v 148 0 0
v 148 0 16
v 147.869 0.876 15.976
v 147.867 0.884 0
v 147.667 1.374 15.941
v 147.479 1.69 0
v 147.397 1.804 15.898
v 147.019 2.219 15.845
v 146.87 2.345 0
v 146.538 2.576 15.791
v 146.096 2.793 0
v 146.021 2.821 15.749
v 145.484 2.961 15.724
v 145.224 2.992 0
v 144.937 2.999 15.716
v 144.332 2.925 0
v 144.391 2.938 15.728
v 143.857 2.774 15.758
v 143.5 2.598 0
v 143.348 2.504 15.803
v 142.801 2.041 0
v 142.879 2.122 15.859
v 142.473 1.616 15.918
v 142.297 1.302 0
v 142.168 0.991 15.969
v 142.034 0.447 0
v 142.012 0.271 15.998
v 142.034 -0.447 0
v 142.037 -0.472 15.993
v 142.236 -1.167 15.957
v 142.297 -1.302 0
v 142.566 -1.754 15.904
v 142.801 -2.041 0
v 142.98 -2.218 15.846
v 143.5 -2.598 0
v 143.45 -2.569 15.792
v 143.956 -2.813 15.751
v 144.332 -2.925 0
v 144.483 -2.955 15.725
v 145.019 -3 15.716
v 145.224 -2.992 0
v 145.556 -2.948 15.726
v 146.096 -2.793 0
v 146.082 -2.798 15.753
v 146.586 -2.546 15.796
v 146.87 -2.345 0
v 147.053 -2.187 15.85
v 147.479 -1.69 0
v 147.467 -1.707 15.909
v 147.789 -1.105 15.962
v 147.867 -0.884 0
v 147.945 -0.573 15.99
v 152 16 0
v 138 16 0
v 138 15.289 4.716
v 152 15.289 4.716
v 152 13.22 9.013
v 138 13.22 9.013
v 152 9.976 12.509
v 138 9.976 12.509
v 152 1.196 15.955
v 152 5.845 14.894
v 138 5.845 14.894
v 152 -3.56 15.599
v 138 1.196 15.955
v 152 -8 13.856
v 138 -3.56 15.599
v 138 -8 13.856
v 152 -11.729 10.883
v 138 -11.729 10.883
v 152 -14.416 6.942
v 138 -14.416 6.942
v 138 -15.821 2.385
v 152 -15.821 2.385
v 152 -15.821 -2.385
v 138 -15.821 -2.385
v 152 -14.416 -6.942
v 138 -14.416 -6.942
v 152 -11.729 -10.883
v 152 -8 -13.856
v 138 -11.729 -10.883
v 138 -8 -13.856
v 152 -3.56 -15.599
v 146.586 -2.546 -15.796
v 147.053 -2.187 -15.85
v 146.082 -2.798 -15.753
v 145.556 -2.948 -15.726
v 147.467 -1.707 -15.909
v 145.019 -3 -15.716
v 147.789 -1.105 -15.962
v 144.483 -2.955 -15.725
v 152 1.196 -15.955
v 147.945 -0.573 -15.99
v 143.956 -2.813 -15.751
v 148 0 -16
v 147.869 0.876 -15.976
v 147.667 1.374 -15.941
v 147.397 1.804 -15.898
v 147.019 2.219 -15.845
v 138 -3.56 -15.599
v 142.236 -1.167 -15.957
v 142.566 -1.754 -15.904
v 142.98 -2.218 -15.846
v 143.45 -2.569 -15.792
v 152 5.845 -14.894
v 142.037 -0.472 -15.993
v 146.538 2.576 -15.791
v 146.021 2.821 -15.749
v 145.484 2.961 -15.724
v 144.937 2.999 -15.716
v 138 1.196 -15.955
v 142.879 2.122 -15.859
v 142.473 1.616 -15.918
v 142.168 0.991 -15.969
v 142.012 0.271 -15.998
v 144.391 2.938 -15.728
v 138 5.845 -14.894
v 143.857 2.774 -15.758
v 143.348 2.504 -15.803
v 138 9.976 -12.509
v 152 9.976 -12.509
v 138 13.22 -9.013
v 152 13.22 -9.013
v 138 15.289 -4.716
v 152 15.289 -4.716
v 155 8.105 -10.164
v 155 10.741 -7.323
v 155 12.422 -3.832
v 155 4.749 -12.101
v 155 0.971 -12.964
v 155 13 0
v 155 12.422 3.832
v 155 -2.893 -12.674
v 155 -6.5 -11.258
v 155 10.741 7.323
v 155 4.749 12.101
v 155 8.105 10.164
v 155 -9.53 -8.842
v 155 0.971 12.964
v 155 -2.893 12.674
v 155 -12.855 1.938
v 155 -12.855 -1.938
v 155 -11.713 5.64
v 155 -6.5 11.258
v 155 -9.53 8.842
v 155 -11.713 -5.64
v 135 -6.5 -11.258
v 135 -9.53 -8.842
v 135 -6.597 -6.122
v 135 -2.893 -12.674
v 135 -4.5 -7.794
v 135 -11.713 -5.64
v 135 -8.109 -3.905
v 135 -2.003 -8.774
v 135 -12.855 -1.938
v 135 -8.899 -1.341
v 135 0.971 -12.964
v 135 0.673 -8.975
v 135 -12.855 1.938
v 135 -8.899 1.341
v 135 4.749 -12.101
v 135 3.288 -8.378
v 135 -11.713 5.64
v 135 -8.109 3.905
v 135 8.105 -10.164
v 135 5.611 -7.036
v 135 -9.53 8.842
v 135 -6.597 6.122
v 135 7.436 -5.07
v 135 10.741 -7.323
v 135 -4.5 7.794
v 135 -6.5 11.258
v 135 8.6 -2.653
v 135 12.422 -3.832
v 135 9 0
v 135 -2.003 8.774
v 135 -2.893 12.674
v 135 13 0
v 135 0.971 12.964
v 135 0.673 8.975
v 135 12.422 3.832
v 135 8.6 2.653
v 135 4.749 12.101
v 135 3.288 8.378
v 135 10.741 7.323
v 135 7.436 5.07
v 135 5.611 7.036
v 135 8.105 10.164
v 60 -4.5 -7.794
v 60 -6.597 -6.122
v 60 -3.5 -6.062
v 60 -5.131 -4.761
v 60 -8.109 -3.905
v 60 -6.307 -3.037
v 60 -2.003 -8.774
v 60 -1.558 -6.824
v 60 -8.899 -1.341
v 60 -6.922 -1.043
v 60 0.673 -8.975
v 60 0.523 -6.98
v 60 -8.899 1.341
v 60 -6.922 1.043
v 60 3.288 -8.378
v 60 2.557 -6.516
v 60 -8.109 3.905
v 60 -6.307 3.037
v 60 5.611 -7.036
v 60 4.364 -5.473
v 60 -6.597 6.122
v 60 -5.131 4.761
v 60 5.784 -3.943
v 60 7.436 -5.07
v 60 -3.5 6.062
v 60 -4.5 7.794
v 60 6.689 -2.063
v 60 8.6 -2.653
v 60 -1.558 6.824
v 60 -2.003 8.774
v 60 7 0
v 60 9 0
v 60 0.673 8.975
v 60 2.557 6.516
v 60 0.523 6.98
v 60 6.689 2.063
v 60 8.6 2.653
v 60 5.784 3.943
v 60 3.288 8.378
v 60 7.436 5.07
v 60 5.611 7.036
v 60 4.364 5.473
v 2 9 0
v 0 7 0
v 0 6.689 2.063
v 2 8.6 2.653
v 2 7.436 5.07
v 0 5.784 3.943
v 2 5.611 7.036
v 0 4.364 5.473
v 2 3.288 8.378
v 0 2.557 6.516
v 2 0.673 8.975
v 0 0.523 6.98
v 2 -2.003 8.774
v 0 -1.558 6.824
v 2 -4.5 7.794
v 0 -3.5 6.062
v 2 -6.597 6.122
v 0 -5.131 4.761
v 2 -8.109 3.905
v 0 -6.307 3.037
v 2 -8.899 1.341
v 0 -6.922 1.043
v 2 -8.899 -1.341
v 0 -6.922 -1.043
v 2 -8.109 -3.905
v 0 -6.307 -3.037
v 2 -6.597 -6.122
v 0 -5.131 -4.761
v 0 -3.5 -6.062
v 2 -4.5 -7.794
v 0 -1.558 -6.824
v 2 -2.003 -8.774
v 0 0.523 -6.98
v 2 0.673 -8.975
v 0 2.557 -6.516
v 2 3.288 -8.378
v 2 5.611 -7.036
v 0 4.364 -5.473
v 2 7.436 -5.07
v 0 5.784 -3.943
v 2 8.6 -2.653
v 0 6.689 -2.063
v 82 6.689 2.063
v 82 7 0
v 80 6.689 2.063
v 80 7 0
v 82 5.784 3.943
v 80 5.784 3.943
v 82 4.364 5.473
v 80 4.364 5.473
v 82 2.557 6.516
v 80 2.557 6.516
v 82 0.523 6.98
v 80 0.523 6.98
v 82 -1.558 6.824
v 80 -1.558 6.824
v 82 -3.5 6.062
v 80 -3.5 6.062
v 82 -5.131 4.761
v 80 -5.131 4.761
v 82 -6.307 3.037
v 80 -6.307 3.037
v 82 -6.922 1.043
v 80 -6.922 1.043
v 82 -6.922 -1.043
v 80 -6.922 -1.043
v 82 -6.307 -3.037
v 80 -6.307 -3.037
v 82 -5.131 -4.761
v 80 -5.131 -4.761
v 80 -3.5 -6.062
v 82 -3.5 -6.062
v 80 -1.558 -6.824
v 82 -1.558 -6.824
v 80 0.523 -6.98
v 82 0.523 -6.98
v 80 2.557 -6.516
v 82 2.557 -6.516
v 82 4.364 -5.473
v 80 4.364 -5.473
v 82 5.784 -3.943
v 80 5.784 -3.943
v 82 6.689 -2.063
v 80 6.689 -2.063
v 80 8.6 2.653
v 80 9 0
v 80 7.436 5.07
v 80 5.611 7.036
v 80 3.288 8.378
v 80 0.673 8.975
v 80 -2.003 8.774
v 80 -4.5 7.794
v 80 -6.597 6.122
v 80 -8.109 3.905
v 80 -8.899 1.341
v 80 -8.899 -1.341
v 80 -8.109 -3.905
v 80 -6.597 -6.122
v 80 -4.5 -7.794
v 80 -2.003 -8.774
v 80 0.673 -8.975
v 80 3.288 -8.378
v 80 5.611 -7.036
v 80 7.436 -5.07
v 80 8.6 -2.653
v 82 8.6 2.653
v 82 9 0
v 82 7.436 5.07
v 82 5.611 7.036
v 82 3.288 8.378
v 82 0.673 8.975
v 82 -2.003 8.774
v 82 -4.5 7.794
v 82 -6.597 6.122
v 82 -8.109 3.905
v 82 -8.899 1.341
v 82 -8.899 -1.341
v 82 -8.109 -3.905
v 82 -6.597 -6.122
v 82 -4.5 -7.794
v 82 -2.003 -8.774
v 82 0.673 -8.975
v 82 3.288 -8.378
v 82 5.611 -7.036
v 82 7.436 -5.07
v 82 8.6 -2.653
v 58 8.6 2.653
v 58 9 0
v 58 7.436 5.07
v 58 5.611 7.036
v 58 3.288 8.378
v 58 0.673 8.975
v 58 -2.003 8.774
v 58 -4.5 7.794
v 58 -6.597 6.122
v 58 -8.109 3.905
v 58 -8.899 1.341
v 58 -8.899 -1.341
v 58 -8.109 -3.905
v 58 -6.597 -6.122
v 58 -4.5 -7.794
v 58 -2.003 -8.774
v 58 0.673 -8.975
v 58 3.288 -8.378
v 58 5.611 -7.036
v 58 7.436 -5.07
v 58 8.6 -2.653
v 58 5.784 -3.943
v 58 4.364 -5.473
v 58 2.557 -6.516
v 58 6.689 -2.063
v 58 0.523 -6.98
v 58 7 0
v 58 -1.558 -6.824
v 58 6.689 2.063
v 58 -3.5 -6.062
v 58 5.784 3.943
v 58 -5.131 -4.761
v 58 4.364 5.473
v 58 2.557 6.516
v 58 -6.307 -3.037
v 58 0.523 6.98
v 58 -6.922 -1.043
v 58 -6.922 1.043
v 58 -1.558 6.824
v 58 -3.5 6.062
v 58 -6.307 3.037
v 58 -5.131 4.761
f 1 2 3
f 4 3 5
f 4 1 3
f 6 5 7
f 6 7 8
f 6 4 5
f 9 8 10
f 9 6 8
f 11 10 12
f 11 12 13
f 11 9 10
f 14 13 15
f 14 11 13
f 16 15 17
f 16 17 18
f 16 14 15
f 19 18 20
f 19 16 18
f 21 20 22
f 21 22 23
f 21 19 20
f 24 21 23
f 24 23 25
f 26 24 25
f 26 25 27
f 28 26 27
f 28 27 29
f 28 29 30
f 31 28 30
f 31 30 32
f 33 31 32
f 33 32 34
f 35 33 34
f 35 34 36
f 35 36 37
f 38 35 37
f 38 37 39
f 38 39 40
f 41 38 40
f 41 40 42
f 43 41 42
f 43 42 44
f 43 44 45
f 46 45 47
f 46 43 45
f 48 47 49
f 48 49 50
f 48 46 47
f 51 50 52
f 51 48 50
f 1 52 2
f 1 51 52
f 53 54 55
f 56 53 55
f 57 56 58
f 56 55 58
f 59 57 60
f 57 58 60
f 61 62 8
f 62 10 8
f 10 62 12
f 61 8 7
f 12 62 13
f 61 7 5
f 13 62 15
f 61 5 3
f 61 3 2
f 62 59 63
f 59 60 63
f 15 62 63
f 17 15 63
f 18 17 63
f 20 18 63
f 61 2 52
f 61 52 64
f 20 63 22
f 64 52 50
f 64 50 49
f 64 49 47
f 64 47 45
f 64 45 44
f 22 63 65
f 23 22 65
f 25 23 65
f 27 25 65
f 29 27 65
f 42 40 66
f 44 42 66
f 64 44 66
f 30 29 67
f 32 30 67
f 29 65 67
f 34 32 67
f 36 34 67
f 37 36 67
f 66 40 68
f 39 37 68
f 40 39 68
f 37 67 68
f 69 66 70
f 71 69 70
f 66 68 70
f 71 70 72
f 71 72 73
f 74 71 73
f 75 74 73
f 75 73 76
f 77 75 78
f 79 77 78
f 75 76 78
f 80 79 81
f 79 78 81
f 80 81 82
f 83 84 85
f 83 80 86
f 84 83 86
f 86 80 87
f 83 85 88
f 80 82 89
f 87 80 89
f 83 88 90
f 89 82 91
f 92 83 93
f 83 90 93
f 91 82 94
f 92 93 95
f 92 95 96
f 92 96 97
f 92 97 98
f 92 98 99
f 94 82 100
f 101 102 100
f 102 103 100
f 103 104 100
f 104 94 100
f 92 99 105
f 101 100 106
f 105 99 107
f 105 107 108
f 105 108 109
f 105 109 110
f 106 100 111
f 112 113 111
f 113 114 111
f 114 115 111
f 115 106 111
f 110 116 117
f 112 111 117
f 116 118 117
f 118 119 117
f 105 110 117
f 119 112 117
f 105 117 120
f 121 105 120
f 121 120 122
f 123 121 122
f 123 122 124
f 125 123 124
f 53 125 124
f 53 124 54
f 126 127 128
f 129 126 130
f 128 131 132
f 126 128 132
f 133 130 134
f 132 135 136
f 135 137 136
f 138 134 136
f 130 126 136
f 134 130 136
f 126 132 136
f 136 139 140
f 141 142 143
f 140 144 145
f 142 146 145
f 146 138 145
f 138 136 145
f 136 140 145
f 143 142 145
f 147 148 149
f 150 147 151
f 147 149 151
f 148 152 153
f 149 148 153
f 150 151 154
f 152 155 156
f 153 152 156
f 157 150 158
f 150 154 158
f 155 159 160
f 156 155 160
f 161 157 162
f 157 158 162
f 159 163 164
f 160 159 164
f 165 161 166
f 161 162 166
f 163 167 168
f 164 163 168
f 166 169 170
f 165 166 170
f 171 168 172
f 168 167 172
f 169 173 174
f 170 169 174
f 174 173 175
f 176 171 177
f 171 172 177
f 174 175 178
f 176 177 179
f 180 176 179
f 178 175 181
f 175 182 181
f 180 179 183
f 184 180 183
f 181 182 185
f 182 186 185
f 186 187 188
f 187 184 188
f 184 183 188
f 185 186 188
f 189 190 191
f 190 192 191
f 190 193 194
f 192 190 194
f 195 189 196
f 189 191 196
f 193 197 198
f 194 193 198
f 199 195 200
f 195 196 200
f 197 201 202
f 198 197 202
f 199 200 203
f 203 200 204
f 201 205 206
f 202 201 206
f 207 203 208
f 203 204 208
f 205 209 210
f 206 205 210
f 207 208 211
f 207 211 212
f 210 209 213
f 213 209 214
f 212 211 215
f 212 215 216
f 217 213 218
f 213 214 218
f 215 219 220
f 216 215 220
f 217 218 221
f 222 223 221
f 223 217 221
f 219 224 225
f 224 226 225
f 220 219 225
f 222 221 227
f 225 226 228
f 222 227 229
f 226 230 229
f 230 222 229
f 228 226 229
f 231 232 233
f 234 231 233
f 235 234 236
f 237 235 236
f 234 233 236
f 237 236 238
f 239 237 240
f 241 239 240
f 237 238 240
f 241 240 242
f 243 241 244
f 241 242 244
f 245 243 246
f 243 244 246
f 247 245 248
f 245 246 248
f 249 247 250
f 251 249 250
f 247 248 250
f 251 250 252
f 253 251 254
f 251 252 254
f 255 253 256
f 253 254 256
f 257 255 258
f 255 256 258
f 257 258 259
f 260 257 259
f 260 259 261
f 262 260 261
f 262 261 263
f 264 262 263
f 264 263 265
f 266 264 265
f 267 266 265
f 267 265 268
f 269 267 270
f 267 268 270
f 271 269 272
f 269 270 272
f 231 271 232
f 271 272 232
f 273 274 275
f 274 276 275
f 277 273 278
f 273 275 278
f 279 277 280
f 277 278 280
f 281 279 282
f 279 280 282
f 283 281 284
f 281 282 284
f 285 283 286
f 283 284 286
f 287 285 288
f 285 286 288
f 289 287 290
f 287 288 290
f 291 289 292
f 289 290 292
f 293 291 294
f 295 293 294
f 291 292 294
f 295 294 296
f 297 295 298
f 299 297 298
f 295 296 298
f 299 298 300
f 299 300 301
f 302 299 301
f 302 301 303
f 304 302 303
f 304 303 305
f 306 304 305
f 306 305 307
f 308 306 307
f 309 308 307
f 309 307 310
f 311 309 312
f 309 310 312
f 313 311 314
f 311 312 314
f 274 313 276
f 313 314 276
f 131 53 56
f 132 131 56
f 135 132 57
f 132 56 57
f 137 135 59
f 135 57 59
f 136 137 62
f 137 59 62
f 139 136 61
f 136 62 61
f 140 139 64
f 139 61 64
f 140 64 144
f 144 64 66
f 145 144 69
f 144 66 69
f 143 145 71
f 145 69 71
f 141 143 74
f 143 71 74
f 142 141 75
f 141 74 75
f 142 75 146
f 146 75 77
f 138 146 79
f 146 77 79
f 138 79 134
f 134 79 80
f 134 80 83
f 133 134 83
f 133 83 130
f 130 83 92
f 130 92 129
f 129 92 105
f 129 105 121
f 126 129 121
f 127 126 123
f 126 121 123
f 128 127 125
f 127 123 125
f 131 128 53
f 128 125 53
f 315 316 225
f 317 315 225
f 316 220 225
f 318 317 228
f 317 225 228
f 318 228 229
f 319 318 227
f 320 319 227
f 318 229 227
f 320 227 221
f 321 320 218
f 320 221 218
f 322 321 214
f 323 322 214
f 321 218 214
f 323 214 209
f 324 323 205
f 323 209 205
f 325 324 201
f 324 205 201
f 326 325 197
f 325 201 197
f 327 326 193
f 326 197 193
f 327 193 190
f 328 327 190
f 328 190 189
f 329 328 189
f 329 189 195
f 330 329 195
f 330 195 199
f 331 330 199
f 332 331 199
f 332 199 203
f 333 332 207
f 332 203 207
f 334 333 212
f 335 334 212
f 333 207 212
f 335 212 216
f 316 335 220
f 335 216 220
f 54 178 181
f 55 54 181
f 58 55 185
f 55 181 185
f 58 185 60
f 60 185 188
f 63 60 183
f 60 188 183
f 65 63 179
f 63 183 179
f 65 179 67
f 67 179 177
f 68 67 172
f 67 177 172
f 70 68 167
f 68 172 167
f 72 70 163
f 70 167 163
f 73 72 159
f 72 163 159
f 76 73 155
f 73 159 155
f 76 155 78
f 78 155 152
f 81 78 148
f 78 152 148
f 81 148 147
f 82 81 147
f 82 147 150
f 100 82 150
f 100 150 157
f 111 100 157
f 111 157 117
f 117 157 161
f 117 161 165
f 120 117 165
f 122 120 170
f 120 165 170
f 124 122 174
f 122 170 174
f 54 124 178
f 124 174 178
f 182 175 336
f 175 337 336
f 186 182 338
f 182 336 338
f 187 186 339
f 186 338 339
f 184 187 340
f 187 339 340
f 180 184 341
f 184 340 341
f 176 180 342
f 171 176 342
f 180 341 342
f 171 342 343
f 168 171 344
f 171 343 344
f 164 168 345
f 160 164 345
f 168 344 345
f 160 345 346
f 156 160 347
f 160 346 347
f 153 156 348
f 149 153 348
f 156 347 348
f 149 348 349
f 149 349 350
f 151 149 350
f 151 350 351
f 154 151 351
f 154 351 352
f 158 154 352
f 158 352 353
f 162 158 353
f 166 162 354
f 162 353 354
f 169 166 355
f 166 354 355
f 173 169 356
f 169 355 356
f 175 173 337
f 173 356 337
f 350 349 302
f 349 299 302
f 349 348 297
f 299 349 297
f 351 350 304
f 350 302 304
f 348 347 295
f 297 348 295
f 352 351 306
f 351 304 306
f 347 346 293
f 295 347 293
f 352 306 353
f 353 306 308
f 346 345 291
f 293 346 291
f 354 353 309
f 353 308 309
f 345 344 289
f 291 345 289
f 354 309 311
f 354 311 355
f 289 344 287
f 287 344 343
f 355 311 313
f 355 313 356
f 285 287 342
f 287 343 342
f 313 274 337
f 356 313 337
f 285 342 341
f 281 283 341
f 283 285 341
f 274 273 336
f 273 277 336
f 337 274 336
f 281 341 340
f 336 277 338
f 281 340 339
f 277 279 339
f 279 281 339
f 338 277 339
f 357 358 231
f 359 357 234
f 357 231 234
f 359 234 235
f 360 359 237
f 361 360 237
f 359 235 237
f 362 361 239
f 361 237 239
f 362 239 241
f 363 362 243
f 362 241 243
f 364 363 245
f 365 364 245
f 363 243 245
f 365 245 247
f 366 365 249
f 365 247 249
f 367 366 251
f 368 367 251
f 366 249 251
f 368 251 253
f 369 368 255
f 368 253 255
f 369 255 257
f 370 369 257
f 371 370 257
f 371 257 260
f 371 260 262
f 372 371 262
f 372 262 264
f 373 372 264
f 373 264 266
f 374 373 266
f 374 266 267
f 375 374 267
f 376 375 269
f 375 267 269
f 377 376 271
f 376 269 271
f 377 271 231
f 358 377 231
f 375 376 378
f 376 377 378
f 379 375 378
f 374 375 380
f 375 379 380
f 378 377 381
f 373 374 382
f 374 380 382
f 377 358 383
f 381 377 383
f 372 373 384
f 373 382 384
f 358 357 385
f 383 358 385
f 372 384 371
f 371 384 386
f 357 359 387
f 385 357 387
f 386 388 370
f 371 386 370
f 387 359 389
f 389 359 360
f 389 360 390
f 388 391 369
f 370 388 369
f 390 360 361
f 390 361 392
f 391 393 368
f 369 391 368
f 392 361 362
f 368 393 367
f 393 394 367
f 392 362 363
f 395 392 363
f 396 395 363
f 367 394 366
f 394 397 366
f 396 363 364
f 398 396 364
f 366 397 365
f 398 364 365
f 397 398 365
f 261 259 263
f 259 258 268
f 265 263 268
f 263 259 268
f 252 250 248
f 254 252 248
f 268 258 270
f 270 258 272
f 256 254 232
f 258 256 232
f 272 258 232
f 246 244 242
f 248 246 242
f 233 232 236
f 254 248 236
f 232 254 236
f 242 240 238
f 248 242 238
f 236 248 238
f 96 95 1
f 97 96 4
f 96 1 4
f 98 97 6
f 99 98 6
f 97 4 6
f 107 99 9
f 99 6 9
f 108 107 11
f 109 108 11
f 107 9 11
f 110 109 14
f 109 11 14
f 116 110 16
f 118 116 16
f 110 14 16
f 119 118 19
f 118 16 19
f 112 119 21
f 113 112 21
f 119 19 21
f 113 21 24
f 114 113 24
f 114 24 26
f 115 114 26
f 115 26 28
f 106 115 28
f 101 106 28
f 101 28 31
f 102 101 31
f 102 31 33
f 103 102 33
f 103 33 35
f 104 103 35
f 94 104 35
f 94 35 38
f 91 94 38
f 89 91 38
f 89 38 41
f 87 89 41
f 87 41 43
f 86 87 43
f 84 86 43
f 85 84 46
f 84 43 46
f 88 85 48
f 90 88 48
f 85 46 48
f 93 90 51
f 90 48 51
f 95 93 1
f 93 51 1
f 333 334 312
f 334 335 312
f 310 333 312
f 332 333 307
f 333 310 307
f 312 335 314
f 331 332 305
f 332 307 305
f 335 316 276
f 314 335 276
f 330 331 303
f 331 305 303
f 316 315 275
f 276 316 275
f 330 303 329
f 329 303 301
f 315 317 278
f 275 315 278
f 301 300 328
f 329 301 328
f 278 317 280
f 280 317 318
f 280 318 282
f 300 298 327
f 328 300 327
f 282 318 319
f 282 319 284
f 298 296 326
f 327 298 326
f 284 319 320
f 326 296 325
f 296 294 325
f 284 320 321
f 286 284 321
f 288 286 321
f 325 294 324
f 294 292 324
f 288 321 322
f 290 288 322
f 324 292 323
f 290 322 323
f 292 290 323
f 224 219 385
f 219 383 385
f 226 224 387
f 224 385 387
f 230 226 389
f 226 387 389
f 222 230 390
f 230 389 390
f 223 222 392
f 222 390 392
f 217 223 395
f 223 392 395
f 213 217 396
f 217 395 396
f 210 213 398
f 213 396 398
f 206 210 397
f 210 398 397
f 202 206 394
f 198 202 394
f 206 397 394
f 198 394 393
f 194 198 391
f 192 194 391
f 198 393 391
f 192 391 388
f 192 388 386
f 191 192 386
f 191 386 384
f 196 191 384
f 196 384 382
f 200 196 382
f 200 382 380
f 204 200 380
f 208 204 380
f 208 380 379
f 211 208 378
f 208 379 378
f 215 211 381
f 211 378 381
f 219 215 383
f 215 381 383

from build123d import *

# Parameters (mm, degrees)
CHAMFER1_SIZE           = 3
CHAMFER2_SIZE           = 2
SKETCH2_R               = 3
CUT_EXTRUDE1_DEPTH      = 17
CUT_EXTRUDE1_DEPTH_BACK = 17


with BuildPart() as part:
    # Sketch1 → Revolve1 (revolve)
    with BuildSketch(Plane.XY):
        Polygon((155, 0), (155, 16), (135, 16), (135, 9), (82, 9), (82, 7), (80, 7), (80, 9), (60, 9), (60, 7), (58, 7), (58, 9), (0, 9), (0, 0), align=None)
    revolve(axis=Axis((0, 0, 0), (1, 0, 0)))

    # Chamfer1
    chamfer1_edges = [part.edges().sort_by_distance(p)[0] for p in [
        (135, -16, 0),
        (155, -16, 0),
    ]]
    chamfer(chamfer1_edges, length=CHAMFER1_SIZE)

    # Chamfer2
    chamfer2_edges = [part.edges().sort_by_distance(p)[0] for p in [
        (0, -9, 0),
    ]]
    chamfer(chamfer2_edges, length=CHAMFER2_SIZE)

    # Sketch2 → Cut-Extrude1 (cut, two sides)
    with BuildSketch(Plane.XY) as cut_extrude1_sk:
        with Locations((145, 0)):
            Circle(SKETCH2_R)
    extrude(amount=CUT_EXTRUDE1_DEPTH, mode=Mode.SUBTRACT)
    extrude(cut_extrude1_sk.sketch, amount=-CUT_EXTRUDE1_DEPTH_BACK, mode=Mode.SUBTRACT)


solid = part.part
